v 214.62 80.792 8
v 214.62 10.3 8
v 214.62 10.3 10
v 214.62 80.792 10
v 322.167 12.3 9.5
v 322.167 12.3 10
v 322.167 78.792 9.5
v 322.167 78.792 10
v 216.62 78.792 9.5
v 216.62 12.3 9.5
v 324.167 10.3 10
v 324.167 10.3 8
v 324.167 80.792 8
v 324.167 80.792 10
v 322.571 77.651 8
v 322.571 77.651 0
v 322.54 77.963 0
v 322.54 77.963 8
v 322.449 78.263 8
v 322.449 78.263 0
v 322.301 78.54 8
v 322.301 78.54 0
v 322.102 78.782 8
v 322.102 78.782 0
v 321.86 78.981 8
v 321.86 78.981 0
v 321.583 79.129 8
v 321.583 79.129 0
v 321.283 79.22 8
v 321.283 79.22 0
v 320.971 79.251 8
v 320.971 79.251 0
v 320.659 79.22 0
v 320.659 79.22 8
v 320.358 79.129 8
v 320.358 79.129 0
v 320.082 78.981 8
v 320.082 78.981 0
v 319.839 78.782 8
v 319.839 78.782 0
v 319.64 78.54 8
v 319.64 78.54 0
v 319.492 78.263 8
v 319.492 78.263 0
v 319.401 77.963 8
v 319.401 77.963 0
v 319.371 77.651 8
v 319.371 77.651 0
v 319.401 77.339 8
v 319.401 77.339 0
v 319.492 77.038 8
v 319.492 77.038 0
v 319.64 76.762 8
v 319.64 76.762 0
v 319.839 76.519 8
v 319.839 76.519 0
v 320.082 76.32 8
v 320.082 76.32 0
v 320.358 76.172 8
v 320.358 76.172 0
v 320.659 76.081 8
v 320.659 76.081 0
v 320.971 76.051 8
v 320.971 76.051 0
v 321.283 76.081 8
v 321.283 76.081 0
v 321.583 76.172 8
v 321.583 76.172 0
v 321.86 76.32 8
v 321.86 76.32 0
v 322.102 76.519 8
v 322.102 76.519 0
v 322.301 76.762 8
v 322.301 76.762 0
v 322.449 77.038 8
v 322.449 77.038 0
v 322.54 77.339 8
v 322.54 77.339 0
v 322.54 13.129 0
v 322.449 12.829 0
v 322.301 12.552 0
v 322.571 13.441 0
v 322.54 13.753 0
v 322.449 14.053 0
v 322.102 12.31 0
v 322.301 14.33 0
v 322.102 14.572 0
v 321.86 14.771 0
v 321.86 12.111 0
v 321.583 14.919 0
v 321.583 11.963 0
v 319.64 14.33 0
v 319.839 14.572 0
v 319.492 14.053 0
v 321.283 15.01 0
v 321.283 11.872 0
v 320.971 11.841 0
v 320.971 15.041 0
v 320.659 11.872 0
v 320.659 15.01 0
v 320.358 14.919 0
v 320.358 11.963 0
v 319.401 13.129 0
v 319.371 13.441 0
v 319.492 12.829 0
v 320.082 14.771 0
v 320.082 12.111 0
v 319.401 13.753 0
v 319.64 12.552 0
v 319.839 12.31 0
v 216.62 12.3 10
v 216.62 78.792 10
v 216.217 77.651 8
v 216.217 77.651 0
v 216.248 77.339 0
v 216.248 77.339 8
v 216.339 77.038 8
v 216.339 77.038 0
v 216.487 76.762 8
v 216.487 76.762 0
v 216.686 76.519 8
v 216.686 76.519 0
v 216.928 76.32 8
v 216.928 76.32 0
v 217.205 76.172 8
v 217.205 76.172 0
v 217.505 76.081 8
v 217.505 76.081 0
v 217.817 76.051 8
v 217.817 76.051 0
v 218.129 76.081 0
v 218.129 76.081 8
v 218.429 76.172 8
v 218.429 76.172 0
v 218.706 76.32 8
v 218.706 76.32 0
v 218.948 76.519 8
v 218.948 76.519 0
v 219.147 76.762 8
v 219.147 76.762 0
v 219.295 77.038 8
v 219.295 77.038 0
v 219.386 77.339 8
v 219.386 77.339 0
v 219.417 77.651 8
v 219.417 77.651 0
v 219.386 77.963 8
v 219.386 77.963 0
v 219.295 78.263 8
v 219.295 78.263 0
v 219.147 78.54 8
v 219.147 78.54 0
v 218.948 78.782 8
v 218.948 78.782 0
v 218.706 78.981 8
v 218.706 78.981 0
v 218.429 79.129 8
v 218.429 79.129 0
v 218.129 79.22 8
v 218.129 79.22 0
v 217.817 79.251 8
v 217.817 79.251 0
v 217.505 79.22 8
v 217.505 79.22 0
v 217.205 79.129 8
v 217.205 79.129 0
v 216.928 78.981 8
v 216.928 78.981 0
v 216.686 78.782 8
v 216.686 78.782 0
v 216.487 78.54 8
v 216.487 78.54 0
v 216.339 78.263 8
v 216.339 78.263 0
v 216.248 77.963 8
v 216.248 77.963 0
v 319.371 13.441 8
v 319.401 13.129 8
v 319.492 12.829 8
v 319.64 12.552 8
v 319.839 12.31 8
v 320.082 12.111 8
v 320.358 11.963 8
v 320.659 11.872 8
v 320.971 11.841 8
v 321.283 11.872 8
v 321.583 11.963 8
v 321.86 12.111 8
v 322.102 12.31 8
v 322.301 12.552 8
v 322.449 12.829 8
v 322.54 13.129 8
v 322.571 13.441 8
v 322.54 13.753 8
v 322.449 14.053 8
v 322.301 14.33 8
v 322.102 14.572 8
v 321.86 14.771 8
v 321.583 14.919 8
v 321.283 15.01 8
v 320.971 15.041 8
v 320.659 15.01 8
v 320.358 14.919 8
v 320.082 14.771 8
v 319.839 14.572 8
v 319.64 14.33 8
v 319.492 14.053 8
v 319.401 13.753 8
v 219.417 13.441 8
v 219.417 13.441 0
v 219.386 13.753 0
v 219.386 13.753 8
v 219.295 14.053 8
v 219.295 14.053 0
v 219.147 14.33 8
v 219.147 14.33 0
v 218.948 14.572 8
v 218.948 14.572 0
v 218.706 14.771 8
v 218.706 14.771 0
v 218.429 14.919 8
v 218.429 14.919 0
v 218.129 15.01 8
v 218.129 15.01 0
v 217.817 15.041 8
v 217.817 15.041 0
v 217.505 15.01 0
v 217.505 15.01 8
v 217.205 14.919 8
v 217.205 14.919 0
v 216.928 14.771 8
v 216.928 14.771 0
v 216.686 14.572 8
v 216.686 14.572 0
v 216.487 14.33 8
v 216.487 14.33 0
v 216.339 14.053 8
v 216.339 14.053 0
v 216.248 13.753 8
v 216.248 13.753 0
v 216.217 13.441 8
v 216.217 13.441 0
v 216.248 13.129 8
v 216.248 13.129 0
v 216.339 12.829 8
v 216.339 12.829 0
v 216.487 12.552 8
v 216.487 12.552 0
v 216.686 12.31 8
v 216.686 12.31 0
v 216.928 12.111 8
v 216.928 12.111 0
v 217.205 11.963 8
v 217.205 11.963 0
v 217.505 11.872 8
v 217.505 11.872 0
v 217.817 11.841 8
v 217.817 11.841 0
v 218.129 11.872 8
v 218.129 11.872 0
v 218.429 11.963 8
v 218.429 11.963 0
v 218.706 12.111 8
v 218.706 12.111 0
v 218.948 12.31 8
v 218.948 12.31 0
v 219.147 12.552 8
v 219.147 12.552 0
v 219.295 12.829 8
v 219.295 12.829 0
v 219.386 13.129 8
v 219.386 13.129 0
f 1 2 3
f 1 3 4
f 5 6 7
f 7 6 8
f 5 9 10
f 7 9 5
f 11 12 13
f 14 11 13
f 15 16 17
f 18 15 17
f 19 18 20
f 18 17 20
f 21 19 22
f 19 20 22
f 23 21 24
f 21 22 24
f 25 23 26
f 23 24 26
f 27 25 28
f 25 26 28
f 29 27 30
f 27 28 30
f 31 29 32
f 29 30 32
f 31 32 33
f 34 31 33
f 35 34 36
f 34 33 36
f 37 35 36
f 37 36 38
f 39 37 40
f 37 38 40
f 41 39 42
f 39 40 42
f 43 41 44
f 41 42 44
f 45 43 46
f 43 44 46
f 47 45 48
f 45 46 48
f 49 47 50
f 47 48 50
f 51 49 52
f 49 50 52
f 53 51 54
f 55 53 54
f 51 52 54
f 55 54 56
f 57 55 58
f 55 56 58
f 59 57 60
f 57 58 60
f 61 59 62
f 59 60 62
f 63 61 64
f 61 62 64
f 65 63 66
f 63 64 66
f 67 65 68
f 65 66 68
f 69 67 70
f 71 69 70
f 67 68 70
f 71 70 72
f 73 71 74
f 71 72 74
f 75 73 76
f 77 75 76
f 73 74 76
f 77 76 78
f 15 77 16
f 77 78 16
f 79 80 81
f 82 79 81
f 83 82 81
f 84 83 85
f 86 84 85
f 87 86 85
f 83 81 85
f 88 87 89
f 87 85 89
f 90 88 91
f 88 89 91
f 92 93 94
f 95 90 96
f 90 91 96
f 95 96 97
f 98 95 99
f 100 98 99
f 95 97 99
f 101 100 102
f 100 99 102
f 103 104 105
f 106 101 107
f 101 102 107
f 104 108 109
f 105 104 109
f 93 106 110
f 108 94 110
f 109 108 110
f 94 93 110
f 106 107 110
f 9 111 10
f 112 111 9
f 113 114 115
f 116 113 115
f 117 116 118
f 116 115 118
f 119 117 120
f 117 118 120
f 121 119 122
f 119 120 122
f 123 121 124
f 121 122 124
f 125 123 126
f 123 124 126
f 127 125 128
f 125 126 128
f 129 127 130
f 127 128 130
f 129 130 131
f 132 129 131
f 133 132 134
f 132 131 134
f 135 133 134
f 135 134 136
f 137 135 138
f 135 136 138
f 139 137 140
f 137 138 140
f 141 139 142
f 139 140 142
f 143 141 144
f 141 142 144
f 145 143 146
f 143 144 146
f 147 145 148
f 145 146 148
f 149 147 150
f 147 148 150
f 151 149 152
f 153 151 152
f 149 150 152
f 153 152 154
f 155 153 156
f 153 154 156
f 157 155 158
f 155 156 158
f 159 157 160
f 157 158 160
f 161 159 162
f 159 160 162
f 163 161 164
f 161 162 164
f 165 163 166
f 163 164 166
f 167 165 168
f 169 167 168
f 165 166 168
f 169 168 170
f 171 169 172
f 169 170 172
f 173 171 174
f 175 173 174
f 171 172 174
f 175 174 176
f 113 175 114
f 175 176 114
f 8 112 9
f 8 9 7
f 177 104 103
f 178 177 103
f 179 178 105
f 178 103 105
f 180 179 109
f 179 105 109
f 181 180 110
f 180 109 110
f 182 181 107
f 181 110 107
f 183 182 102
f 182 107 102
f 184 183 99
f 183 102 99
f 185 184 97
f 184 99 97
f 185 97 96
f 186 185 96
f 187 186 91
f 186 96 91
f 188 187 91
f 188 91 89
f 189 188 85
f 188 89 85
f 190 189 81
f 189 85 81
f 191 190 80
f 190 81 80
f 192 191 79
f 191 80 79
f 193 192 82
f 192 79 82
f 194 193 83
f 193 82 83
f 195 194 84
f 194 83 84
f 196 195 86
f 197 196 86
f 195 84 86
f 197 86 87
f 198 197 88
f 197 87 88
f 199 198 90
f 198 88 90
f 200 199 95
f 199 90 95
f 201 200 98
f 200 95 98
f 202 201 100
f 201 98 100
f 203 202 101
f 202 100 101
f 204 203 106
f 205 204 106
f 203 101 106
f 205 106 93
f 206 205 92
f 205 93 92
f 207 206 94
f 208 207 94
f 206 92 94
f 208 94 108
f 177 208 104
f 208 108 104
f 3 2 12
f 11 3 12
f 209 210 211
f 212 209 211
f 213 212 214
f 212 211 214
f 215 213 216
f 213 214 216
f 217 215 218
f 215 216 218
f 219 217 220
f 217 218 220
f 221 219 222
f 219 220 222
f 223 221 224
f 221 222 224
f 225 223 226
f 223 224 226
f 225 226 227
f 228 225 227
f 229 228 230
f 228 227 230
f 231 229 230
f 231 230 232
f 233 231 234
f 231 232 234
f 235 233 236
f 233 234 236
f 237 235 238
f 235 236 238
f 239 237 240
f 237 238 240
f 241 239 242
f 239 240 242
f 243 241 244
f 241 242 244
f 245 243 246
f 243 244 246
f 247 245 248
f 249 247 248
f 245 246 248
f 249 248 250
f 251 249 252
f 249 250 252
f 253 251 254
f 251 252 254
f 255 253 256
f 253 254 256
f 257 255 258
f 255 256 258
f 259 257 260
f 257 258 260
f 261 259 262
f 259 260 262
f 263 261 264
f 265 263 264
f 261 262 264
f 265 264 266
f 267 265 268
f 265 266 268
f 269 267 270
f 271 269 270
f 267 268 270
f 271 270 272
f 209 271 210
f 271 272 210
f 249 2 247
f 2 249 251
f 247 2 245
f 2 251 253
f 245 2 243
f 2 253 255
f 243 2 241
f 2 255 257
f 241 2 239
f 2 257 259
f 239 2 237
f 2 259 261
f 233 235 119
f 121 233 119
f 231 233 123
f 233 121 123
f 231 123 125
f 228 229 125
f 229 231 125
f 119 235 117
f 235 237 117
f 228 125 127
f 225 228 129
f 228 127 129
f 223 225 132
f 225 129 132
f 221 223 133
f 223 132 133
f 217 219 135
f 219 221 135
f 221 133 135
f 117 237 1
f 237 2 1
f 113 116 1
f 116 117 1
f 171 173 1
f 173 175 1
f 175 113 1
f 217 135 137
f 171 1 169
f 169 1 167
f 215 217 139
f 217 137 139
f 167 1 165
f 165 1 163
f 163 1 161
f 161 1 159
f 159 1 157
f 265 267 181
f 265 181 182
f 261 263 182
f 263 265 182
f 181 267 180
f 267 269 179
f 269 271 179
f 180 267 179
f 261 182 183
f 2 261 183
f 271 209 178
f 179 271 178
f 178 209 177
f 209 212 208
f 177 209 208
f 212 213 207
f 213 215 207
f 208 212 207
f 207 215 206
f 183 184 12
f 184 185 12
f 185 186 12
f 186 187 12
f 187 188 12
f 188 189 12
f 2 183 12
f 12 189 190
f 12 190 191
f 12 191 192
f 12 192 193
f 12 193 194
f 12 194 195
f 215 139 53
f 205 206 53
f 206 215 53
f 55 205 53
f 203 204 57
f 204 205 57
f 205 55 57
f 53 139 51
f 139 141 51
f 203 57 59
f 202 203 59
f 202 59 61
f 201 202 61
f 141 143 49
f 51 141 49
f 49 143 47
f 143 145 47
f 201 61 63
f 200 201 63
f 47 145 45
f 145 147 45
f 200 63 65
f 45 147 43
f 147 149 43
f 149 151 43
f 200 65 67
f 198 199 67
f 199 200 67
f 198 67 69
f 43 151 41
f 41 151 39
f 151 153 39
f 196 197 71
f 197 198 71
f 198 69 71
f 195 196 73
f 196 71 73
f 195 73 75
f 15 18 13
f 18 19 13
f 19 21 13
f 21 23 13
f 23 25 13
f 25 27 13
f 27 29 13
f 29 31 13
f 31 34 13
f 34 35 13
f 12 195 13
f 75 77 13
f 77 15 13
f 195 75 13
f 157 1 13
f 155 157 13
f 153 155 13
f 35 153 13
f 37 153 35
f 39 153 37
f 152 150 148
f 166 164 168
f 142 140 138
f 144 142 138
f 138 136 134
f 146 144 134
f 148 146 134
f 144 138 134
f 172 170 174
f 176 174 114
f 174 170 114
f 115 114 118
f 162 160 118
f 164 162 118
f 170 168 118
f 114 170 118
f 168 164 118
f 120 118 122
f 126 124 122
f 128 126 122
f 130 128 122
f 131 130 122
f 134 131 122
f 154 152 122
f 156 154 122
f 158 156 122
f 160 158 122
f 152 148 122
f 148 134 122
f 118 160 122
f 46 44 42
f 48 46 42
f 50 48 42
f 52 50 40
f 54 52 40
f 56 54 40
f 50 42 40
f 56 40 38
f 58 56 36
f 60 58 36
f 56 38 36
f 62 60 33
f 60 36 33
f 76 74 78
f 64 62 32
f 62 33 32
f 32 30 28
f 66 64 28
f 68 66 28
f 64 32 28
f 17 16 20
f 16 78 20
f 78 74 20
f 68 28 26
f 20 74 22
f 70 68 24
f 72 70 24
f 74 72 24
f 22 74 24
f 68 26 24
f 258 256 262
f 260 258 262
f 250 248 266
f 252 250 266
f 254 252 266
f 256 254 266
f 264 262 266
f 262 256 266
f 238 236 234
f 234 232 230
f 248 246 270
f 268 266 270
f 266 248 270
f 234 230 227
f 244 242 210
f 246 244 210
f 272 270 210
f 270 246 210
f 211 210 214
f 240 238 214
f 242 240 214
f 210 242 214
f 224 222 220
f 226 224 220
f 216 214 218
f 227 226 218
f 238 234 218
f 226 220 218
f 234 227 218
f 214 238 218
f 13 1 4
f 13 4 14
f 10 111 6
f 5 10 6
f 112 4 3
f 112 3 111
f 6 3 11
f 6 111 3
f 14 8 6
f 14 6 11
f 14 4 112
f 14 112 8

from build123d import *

# Parameters (mm, degrees)
SKETCH_1_R          = 1.6
EXTRUDE_1_DEPTH     = 8
EXTRUDE_1_2_DEPTH   = 8
EXTRUDE_1_3_DEPTH   = 8
EXTRUDE_1_4_DEPTH   = 8
SKETCH_2_W          = 109.546924753
SKETCH_2_H          = 70.491732923
EXTRUDE_2_DEPTH     = 2
SKETCH_3_W          = 105.546924753
SKETCH_3_H          = 66.491732923
CUT_EXTRUDE_1_DEPTH = 0.5


with BuildPart() as part:
    # 草图1 → 凸台-拉伸1 (new body)
    with BuildSketch(Plane.XY):
        with Locations((320.970675526, 77.650698191)):
            Circle(SKETCH_1_R)
    extrude(amount=EXTRUDE_1_DEPTH)



with BuildPart() as body_2:
    # 草图1 → Extrude 1 2 (new body)
    with BuildSketch(Plane.XY):
        with Locations(Location((320.970675526, 13.440898947, 0), (0, 0, 180))):
            Circle(SKETCH_1_R)
    extrude(amount=EXTRUDE_1_2_DEPTH)


with BuildPart() as body_3:
    # 草图1 → Extrude 1 3 (new body)
    with BuildSketch(Plane.XY):
        with Locations((217.817076829, 13.440898947)):
            Circle(SKETCH_1_R)
    extrude(amount=EXTRUDE_1_3_DEPTH)


with BuildPart() as body_4:
    # 草图1 → Extrude 1 4 (new body)
    with BuildSketch(Plane.XY):
        with Locations(Location((217.817076829, 77.650698191, 0), (0, 0, 180))):
            Circle(SKETCH_1_R)
    extrude(amount=EXTRUDE_1_4_DEPTH)


with BuildPart() as part_1:
    add(part.part)

    add(body_2.part)  # 凸台-拉伸2 merges body 2

    add(body_3.part)  # 凸台-拉伸2 merges body 3

    add(body_4.part)  # 凸台-拉伸2 merges body 4
    # 草图2 → 凸台-拉伸2 (add)
    with BuildSketch(Plane.XY.offset(8)):
        with Locations((269.393876178, 45.545798569)):
            Rectangle(SKETCH_2_W, SKETCH_2_H)
    extrude(amount=EXTRUDE_2_DEPTH)

    # 草图3 → 切除-拉伸1 (cut)
    with BuildSketch(Plane.XY.offset(10)):
        with Locations((269.393876178, 45.545798569)):
            Rectangle(SKETCH_3_W, SKETCH_3_H)
    extrude(amount=-CUT_EXTRUDE_1_DEPTH, mode=Mode.SUBTRACT)


solid = part_1.part
